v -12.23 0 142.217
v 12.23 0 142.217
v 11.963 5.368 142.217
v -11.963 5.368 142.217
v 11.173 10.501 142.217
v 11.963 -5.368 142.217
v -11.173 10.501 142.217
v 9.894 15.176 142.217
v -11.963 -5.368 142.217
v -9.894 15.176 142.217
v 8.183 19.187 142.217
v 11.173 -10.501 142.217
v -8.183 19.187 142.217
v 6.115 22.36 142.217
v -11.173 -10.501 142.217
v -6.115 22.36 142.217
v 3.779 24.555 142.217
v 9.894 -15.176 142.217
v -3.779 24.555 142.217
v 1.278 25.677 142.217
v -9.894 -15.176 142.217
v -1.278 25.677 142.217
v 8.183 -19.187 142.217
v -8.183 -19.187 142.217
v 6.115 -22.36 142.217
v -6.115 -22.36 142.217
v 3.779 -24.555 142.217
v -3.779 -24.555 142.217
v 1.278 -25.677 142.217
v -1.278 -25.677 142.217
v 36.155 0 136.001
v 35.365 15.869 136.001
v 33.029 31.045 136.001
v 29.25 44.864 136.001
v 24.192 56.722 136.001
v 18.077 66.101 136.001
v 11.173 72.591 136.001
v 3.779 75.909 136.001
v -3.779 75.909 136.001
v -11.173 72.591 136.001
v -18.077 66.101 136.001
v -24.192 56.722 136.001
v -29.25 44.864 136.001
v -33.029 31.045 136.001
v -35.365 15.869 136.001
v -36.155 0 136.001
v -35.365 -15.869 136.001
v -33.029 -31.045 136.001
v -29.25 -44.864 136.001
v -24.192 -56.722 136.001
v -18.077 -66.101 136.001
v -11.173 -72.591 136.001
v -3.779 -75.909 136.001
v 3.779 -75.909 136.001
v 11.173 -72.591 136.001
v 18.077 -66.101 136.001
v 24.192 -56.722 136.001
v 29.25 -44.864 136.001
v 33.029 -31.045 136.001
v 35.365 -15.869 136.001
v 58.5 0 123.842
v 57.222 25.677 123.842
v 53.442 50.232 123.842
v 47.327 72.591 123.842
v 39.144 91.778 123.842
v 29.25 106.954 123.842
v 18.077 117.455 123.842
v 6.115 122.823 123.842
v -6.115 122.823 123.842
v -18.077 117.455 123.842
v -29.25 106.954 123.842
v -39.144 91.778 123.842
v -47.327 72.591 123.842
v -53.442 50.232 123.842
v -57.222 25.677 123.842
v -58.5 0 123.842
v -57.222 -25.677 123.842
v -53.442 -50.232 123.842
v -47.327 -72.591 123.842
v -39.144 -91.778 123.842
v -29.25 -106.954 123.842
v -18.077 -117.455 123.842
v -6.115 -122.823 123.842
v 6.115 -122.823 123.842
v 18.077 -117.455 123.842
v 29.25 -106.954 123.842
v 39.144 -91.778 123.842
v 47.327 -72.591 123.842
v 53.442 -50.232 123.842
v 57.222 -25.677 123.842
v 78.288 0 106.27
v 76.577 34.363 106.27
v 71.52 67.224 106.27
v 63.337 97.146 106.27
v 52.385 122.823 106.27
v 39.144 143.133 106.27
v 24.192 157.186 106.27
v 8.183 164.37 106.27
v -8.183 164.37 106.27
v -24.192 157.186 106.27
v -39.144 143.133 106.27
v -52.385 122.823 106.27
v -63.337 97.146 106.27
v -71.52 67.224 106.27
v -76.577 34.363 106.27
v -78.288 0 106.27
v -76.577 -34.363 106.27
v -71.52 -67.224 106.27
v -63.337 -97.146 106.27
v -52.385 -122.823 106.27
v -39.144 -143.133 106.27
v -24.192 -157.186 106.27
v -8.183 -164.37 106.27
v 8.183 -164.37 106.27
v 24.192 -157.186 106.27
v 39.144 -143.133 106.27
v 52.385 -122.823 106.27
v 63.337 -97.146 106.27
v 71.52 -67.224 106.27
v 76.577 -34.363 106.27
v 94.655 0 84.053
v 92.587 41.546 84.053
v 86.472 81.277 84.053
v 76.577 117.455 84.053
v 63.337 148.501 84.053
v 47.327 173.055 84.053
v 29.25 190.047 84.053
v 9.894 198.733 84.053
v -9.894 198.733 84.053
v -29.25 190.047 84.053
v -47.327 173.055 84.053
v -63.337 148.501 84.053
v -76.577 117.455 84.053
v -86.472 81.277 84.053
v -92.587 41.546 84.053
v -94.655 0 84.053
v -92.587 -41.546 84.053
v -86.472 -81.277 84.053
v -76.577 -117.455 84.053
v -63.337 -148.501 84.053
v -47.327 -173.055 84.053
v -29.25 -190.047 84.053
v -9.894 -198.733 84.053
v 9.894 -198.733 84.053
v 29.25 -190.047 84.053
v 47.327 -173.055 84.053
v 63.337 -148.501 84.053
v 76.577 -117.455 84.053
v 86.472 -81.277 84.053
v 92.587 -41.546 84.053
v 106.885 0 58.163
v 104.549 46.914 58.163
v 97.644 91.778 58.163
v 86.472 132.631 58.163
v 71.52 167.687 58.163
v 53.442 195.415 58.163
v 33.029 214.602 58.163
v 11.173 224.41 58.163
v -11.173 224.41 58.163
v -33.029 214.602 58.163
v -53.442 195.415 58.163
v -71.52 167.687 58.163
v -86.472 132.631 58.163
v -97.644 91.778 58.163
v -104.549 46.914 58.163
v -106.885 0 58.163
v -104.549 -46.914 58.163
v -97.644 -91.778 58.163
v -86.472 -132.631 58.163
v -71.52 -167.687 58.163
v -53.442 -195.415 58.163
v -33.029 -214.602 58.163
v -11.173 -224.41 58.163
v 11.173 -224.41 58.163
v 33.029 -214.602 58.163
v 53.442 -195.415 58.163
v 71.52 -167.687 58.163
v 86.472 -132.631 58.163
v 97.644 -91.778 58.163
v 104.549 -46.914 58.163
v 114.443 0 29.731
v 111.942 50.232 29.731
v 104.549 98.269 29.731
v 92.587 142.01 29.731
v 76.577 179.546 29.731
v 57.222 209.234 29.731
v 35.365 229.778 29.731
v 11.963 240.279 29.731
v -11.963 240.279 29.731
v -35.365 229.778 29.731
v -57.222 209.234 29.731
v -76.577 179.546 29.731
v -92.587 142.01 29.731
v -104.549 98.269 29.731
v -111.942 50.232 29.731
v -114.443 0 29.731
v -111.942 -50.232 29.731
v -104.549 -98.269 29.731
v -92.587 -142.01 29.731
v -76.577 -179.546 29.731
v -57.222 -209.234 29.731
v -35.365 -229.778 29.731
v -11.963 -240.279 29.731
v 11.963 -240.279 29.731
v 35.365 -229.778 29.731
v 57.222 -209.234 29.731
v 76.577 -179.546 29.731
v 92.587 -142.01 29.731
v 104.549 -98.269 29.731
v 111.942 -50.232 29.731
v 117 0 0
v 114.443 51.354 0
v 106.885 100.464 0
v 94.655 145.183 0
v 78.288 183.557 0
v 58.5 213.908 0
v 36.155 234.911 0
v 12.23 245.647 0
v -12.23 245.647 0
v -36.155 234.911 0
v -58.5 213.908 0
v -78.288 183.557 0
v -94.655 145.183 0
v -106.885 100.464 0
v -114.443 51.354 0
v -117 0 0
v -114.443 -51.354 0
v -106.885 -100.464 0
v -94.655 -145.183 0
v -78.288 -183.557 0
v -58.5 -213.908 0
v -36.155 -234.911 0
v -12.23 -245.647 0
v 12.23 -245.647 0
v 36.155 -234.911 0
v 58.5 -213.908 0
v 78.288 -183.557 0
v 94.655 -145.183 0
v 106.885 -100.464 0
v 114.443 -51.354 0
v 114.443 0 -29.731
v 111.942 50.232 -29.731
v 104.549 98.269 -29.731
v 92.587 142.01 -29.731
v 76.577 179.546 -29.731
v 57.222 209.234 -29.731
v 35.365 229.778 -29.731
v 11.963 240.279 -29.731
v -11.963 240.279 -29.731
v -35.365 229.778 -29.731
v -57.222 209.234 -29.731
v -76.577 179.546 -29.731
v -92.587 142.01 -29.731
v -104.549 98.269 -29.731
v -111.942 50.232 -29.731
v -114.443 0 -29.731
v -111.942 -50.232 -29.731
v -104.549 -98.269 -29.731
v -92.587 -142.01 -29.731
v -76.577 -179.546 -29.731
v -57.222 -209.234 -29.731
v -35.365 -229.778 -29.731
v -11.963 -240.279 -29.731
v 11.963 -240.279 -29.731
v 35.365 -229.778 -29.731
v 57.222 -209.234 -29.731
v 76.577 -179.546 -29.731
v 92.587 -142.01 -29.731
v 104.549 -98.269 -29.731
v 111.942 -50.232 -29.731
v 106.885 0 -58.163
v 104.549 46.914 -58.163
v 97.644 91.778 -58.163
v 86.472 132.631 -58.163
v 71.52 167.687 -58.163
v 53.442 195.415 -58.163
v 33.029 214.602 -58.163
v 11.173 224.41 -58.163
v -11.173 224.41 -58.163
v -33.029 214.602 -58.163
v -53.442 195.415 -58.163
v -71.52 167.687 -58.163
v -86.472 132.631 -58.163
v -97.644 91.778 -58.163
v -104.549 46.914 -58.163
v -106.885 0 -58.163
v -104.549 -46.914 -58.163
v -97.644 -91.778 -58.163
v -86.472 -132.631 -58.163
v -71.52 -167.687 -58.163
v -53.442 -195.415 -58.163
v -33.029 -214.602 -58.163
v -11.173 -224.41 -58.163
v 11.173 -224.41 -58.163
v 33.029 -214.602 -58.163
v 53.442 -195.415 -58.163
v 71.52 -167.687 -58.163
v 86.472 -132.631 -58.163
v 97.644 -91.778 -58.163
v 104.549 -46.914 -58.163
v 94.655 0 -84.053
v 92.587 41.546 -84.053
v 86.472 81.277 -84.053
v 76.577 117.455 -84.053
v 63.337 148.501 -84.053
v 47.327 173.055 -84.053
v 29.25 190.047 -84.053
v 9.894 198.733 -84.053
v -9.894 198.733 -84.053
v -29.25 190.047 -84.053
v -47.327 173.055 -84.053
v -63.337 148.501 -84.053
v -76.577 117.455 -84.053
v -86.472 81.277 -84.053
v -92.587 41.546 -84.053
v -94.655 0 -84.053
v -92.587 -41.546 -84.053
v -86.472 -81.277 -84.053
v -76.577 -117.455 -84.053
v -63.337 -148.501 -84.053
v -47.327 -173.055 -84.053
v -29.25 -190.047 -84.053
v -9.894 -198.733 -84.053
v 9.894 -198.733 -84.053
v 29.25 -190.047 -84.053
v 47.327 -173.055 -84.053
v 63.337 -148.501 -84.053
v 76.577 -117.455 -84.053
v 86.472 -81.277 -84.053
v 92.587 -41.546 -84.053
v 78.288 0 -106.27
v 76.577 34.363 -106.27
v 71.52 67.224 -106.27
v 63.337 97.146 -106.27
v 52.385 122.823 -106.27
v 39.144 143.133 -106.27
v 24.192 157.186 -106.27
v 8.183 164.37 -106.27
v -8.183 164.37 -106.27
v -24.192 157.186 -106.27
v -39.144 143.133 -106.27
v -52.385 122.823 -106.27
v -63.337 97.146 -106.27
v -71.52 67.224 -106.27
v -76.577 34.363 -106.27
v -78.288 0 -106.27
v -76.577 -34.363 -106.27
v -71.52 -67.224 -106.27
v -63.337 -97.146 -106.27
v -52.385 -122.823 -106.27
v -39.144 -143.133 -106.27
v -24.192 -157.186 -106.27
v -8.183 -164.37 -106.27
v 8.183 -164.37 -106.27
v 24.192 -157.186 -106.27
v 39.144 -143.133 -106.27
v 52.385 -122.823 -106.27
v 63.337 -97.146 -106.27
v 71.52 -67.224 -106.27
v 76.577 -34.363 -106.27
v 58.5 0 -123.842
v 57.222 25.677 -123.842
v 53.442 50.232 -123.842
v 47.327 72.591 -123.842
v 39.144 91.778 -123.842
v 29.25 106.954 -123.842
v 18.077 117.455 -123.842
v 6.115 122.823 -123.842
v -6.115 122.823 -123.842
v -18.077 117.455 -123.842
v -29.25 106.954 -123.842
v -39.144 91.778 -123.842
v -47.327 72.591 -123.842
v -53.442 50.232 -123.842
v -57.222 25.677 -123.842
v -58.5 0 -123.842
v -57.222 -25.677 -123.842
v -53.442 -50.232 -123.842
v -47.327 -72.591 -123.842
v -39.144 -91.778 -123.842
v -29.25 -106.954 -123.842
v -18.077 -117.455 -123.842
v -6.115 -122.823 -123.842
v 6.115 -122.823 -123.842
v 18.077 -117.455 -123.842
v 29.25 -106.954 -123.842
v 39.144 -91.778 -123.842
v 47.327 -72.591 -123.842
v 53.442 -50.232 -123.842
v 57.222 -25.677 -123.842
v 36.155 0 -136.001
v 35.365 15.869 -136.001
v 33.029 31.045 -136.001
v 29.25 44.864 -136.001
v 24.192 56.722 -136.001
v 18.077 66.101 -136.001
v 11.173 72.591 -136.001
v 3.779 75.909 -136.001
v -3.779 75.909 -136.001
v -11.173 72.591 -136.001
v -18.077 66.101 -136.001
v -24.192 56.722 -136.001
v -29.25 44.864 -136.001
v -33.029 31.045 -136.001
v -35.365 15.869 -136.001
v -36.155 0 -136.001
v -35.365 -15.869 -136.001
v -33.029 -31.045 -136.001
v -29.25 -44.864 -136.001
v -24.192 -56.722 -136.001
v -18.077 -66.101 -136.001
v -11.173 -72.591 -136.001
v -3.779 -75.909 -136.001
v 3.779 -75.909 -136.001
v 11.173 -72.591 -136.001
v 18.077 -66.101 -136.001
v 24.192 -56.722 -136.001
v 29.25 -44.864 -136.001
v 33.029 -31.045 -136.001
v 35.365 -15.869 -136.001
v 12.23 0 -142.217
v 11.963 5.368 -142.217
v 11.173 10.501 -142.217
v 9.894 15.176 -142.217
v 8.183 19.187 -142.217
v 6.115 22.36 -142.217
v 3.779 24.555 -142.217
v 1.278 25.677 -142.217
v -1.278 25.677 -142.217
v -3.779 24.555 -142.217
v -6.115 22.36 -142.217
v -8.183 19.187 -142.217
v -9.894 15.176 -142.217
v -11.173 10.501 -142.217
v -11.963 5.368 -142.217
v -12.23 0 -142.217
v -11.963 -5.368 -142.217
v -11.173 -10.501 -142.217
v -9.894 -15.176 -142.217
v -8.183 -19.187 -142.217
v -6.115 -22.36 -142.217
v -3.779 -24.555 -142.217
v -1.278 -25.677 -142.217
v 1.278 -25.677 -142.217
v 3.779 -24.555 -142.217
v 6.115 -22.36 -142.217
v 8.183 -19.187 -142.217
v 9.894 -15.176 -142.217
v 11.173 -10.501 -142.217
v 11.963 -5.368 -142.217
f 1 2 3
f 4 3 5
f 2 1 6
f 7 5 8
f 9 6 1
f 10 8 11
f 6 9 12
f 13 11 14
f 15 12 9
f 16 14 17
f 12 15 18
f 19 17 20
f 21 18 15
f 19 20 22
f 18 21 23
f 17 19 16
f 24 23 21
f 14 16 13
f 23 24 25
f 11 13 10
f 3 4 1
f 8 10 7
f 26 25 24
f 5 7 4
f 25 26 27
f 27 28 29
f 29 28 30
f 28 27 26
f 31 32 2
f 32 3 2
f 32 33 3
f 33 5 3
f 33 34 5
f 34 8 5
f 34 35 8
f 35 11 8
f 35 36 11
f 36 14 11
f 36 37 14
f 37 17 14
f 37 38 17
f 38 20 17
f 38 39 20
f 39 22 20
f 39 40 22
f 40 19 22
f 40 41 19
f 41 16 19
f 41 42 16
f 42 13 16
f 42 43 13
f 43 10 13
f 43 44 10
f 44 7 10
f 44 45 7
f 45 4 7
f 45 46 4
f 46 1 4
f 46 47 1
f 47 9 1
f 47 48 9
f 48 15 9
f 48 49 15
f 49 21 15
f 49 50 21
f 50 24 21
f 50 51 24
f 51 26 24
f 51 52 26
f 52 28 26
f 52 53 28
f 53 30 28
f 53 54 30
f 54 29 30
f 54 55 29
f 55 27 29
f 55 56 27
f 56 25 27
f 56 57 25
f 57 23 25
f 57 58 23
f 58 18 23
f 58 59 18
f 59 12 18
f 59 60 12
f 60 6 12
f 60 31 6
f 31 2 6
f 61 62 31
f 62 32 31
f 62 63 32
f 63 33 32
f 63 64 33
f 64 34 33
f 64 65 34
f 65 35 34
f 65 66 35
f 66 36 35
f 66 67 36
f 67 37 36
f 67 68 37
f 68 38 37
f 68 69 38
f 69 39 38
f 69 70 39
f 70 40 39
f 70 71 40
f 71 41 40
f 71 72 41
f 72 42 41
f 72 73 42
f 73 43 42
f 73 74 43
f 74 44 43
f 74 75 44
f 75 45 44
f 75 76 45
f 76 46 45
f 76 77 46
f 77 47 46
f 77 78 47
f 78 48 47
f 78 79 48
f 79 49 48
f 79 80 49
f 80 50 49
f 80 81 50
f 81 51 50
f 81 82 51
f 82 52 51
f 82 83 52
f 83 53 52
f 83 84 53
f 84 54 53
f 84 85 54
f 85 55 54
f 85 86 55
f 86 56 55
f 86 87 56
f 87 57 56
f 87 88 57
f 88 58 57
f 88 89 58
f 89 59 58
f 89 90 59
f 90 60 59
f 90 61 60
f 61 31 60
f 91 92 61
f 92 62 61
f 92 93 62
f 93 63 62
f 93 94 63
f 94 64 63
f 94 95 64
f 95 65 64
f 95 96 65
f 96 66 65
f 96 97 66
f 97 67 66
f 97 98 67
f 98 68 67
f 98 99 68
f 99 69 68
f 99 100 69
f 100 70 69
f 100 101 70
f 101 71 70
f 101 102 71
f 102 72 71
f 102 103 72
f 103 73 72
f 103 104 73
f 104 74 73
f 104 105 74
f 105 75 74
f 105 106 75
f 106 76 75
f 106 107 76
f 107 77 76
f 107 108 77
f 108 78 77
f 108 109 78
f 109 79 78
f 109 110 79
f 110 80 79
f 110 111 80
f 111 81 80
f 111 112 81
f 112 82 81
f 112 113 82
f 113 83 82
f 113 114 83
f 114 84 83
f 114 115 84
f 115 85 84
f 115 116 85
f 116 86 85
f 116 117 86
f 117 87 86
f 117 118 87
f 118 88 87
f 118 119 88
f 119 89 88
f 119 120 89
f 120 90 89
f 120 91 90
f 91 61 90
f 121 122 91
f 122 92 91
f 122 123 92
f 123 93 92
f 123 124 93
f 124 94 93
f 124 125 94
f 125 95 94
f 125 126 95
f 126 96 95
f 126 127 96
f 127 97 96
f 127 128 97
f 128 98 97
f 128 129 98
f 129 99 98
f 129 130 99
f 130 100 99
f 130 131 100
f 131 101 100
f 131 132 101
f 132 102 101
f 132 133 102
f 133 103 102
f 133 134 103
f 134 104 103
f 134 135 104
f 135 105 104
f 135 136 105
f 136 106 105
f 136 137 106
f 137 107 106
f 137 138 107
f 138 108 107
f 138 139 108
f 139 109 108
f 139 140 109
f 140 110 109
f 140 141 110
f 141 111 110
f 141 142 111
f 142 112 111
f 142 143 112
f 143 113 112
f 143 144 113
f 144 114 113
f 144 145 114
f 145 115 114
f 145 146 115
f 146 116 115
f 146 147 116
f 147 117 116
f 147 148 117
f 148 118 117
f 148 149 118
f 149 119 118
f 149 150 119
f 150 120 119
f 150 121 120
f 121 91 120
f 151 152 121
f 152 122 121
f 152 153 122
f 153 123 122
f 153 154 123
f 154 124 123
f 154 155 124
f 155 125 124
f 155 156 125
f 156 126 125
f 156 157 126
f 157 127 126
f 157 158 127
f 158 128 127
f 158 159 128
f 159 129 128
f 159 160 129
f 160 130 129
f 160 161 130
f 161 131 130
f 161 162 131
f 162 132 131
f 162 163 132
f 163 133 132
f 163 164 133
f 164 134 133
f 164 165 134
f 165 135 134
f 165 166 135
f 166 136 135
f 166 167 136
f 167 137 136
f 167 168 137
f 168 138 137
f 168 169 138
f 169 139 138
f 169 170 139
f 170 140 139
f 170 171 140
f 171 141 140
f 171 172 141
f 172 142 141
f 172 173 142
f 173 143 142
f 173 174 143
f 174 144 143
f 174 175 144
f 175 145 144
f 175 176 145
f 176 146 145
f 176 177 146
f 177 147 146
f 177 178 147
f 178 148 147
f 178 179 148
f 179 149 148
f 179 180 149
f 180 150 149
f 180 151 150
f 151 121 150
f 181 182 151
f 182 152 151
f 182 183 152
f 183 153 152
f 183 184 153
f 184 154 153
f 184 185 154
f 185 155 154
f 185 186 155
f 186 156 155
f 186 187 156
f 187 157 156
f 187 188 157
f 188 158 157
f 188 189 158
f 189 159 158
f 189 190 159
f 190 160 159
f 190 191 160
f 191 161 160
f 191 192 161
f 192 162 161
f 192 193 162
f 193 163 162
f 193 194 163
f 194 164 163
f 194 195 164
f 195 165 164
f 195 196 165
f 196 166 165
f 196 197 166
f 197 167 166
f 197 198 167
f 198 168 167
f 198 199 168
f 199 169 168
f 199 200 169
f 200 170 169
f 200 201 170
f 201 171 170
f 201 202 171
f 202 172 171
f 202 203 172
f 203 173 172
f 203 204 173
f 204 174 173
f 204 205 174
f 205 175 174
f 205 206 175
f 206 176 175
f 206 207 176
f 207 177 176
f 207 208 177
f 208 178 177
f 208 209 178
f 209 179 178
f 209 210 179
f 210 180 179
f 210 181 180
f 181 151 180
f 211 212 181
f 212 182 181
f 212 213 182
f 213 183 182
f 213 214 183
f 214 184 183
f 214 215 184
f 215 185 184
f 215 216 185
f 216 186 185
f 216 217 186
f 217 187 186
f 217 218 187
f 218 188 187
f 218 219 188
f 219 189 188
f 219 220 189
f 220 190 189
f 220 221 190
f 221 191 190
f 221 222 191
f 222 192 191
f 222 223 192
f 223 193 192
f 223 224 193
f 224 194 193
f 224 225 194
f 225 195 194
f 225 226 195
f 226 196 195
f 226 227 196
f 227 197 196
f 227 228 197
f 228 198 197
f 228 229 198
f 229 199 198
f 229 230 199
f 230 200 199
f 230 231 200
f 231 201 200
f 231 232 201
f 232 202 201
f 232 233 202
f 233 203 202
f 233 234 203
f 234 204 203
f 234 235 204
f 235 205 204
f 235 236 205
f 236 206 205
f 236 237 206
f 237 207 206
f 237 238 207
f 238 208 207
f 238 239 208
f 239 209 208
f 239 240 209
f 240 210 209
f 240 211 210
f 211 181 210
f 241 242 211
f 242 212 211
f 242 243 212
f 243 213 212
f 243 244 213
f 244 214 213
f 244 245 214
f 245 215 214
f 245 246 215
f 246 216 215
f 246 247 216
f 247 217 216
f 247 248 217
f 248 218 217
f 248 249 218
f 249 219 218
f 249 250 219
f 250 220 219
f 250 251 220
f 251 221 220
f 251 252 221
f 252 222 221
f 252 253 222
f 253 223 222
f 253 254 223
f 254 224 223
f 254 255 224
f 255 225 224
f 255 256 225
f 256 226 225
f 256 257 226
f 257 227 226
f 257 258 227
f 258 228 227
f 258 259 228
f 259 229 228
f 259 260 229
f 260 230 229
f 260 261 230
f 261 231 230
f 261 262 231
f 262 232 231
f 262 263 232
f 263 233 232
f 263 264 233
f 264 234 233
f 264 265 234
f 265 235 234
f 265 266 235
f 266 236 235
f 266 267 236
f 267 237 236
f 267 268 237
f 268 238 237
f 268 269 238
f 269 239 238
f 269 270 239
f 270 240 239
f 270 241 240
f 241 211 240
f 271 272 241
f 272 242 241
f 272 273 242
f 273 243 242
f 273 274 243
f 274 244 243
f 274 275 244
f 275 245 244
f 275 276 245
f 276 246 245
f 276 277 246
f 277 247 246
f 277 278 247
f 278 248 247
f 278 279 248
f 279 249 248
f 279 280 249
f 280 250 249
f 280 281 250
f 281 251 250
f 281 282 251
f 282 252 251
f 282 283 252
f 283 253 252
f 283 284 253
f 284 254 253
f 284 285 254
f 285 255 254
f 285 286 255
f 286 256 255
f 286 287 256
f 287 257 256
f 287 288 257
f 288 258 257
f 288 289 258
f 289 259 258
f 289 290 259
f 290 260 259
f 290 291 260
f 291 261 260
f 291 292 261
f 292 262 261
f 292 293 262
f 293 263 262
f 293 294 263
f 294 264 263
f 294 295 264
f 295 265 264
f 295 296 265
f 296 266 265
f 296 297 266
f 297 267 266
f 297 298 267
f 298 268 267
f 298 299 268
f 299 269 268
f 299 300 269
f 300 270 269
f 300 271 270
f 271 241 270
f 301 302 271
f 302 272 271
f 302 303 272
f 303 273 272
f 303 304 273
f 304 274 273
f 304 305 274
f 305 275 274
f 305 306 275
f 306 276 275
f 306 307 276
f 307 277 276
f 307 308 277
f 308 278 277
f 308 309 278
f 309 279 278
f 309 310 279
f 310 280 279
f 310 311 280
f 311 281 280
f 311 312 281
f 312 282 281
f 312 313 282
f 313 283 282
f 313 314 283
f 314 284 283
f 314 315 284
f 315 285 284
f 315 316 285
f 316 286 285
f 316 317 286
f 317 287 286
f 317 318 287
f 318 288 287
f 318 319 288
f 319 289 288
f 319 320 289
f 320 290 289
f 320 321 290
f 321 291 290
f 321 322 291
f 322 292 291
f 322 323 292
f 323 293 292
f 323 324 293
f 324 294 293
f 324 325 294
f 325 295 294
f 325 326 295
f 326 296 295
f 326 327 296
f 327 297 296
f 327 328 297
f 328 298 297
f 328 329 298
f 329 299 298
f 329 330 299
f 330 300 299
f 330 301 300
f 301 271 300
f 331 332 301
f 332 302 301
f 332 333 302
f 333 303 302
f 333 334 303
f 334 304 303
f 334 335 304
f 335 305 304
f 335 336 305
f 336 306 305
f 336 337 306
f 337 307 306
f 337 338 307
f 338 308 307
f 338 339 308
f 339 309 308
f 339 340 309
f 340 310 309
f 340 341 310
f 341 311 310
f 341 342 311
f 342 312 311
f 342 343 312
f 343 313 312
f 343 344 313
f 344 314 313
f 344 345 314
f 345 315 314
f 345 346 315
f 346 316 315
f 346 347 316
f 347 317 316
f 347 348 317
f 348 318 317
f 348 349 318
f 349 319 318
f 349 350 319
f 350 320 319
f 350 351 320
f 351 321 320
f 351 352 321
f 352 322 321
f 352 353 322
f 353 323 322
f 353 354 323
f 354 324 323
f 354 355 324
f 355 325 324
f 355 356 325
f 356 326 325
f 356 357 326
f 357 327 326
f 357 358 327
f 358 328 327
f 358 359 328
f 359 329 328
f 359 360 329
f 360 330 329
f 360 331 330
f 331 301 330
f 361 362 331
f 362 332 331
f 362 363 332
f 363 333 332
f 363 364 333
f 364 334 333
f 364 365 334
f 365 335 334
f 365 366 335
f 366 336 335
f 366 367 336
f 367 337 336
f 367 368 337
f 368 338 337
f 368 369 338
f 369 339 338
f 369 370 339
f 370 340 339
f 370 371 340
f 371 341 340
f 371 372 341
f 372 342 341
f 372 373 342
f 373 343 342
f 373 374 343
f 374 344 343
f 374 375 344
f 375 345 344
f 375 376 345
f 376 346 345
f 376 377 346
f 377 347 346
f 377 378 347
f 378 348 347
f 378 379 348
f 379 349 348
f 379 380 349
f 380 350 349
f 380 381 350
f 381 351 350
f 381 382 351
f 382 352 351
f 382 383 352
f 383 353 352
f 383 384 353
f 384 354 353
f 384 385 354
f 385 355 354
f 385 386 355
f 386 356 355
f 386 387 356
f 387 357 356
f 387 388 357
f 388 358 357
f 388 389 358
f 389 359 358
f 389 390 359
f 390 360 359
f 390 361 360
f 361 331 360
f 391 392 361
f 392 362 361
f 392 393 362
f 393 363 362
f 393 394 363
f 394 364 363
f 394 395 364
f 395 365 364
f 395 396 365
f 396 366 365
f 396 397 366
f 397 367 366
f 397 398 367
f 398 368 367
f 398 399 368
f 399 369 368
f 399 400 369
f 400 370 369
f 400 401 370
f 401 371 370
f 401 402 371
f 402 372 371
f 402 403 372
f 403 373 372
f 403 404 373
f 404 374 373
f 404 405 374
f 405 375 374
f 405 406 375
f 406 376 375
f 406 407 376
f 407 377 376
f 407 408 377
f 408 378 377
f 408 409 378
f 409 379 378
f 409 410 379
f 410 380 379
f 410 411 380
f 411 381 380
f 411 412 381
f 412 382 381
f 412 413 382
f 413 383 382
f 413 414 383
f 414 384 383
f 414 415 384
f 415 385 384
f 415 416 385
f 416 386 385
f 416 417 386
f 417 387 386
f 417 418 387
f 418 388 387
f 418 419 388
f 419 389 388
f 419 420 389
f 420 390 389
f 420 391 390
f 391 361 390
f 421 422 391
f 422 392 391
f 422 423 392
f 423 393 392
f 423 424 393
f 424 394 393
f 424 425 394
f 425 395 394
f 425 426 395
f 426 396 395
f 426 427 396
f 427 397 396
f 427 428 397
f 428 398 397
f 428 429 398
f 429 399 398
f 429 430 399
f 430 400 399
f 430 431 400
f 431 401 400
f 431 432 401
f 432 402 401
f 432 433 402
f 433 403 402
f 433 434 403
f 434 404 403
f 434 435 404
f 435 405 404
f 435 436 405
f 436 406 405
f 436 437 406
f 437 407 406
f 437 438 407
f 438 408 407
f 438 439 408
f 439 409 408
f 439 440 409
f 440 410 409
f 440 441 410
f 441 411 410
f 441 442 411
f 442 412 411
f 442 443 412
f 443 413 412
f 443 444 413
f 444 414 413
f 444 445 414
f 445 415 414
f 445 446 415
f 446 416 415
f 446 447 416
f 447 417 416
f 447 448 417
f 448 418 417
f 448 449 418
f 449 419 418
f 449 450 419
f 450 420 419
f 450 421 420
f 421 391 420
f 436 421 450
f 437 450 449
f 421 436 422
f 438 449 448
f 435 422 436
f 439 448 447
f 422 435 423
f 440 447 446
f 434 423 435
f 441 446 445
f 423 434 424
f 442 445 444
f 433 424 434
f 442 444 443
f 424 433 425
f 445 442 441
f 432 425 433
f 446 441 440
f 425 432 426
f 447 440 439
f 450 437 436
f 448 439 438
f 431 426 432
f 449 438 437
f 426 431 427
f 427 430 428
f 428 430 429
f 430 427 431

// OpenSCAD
// Generated by SolidPython 1.0.1 on 2020-07-29 00:46:49


scale(v = [9, 19, 11]) {
	sphere(r = 13);
}
/***********************************************
*********      SolidPython code:      **********
************************************************
 
# import packages: SolidPython
from solid import *
from solid.utils import *
from itertools import chain, combinations, permutations


class Resize:

    def __init__(self, scad_file):
        self.scad_file = scad_file
        #self.scad_file = import_scad(scad_file)
        # cone/cylinder param:
        self.r1 = 0
        self.r2 = 0
        self.h = 0
        # rectangular prism param:
        self.w = 0
        self.l = 0
        # ellipse param:
        self.r = 0

    # import OpenScad code (file name corresponds to shape)


    # classify shape + parameters
    def assign(self, param1, param2, param3):
        if self.scad_file == 'cone.scad':
            self.r1 = param1
            self.r2 = param2
            self.h = param3
        elif self.scad_file == 'cylinder.scad':
            self.r1 = param1
            self.r2 = param2
            self.h = param3
        elif self.scad_file == 'rectangularPrism.scad':
            self.h = param1
            self.l = param2
            self.w = param3
        else:
            self.r = param1
            self.h = param2

    # resize parameters
    def iterate(self):
        x = range(3, 20, 2)
        i = 1
        if self.scad_file == 'cone.scad':
            tempList = list(permutations(x, 2))
            for temp in tempList:
                param1 = temp[0]
                param2 = temp[1]
                filepath = 'produced_scad_files/' + 'cone' + str(param1) + '_' + str(param2) + '_' + '.scad'
                scad_render_to_file(cylinder(h=param1, r1=param2, r2=0), filepath)

        elif self.scad_file == 'cylinder.scad':
            tempList = list(permutations(x, 3))
            for temp in tempList:
                param1 = temp[0]
                param2 = temp[1]
                filepath = 'produced_scad_files/' + 'cylinder' + str(param1) + '_' + str(param2) + '_' + '.scad'
                scad_render_to_file(cylinder(h=param1, r1=param2, r2=param2), filepath)

        elif self.scad_file == 'rectangularPrism.scad':
            tempList = list(permutations(x, 3))
            for temp in tempList:
                param1 = temp[0]
                param2 = temp[1]
                param3 = temp[2]
                filepath = 'produced_scad_files/' + 'rectangularPrism' + str(param1) + '_' + str(param2) + '_' + str(
                    param3) + '.scad'
                scad_render_to_file(cube(size=(param1, param2, param3)), filepath)

        elif self.scad_file == 'ellipse.scad':
            tempList = list(permutations(x, 4))
            for temp in tempList:
                param1 = temp[0]
                param2 = temp[1]
                param3 = temp[2]
                param4 = temp[3]
                filepath = 'produced_scad_files/' + 'ellipse' + str(param1) + '_' + str(param2) + '_' + str(param3) + '_' + str(param4) + '.scad'
                scad_render_to_file(scale([param1, param2, param3])(sphere(r=param4)), filepath)

    def render_to_scadfile(self):
        scad_render_to_file(scad, 'example.scad') 
 
************************************************/
